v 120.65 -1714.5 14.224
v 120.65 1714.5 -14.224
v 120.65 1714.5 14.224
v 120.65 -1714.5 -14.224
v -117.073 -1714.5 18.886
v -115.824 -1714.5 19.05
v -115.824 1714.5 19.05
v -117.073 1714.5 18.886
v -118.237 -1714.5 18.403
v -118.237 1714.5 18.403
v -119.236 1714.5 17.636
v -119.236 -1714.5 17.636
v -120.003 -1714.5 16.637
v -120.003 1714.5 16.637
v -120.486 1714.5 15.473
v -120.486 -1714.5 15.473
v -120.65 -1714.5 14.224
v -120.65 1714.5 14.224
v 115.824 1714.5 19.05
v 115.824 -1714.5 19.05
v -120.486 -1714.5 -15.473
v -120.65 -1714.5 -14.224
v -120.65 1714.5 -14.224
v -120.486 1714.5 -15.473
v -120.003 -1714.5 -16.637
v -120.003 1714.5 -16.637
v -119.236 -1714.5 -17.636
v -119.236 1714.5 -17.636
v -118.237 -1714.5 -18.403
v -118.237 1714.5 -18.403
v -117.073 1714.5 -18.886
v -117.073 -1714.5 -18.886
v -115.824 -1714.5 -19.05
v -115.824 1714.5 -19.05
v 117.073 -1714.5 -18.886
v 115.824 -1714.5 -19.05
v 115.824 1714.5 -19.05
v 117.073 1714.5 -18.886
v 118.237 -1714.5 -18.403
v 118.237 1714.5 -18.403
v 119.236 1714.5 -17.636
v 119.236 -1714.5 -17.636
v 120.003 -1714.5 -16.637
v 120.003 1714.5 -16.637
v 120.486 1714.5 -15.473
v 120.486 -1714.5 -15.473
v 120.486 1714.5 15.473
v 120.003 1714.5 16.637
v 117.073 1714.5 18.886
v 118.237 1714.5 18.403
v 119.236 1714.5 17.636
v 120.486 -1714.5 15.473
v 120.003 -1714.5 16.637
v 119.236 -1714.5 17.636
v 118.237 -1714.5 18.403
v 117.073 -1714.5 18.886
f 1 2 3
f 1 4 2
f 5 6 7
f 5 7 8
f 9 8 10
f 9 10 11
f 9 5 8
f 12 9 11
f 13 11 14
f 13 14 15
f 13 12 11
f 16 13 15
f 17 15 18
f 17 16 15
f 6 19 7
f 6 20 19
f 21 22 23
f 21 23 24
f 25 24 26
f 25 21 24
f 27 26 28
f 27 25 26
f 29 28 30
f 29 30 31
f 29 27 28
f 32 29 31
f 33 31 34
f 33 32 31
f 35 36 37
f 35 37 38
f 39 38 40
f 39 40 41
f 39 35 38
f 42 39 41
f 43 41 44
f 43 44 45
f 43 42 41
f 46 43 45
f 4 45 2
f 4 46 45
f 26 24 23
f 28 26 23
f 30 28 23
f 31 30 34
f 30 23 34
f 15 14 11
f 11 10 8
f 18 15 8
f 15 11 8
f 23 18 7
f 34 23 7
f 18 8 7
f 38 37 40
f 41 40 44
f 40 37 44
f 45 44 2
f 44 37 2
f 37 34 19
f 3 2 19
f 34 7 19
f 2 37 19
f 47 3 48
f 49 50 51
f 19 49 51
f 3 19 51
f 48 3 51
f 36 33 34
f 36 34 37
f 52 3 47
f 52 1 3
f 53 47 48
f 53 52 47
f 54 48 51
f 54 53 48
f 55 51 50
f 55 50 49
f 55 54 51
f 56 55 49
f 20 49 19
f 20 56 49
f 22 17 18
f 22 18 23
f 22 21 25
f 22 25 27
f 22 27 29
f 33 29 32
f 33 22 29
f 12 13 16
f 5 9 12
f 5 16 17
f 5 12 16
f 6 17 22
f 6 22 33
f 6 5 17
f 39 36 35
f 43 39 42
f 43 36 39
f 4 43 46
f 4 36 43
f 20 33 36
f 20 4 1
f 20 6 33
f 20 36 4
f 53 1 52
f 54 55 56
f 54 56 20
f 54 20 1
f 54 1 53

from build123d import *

# Parameters (mm, degrees)
F1_DEPTH = 1714.5


with BuildPart() as f1:
    # F0 (on Front) → F1 (new body, symmetric)
    with BuildSketch(Plane.XZ):
        with BuildLine():
            Line((115.824, 19.05), (-115.824, 19.05))
            ThreePointArc((-115.824, 19.05), (-119.236497, 17.636497), (-120.65, 14.224))
            Line((-120.65, 14.224), (-120.65, -14.224))
            ThreePointArc((-120.65, -14.224), (-119.236497, -17.636497), (-115.824, -19.05))
            Line((-115.824, -19.05), (115.824, -19.05))
            ThreePointArc((115.824, -19.05), (119.236497, -17.636497), (120.65, -14.224))
            Line((120.65, -14.224), (120.65, 14.224))
            ThreePointArc((120.65, 14.224), (119.236497, 17.636497), (115.824, 19.05))
        make_face()
    extrude(amount=F1_DEPTH, both=True)


solid = f1.part
